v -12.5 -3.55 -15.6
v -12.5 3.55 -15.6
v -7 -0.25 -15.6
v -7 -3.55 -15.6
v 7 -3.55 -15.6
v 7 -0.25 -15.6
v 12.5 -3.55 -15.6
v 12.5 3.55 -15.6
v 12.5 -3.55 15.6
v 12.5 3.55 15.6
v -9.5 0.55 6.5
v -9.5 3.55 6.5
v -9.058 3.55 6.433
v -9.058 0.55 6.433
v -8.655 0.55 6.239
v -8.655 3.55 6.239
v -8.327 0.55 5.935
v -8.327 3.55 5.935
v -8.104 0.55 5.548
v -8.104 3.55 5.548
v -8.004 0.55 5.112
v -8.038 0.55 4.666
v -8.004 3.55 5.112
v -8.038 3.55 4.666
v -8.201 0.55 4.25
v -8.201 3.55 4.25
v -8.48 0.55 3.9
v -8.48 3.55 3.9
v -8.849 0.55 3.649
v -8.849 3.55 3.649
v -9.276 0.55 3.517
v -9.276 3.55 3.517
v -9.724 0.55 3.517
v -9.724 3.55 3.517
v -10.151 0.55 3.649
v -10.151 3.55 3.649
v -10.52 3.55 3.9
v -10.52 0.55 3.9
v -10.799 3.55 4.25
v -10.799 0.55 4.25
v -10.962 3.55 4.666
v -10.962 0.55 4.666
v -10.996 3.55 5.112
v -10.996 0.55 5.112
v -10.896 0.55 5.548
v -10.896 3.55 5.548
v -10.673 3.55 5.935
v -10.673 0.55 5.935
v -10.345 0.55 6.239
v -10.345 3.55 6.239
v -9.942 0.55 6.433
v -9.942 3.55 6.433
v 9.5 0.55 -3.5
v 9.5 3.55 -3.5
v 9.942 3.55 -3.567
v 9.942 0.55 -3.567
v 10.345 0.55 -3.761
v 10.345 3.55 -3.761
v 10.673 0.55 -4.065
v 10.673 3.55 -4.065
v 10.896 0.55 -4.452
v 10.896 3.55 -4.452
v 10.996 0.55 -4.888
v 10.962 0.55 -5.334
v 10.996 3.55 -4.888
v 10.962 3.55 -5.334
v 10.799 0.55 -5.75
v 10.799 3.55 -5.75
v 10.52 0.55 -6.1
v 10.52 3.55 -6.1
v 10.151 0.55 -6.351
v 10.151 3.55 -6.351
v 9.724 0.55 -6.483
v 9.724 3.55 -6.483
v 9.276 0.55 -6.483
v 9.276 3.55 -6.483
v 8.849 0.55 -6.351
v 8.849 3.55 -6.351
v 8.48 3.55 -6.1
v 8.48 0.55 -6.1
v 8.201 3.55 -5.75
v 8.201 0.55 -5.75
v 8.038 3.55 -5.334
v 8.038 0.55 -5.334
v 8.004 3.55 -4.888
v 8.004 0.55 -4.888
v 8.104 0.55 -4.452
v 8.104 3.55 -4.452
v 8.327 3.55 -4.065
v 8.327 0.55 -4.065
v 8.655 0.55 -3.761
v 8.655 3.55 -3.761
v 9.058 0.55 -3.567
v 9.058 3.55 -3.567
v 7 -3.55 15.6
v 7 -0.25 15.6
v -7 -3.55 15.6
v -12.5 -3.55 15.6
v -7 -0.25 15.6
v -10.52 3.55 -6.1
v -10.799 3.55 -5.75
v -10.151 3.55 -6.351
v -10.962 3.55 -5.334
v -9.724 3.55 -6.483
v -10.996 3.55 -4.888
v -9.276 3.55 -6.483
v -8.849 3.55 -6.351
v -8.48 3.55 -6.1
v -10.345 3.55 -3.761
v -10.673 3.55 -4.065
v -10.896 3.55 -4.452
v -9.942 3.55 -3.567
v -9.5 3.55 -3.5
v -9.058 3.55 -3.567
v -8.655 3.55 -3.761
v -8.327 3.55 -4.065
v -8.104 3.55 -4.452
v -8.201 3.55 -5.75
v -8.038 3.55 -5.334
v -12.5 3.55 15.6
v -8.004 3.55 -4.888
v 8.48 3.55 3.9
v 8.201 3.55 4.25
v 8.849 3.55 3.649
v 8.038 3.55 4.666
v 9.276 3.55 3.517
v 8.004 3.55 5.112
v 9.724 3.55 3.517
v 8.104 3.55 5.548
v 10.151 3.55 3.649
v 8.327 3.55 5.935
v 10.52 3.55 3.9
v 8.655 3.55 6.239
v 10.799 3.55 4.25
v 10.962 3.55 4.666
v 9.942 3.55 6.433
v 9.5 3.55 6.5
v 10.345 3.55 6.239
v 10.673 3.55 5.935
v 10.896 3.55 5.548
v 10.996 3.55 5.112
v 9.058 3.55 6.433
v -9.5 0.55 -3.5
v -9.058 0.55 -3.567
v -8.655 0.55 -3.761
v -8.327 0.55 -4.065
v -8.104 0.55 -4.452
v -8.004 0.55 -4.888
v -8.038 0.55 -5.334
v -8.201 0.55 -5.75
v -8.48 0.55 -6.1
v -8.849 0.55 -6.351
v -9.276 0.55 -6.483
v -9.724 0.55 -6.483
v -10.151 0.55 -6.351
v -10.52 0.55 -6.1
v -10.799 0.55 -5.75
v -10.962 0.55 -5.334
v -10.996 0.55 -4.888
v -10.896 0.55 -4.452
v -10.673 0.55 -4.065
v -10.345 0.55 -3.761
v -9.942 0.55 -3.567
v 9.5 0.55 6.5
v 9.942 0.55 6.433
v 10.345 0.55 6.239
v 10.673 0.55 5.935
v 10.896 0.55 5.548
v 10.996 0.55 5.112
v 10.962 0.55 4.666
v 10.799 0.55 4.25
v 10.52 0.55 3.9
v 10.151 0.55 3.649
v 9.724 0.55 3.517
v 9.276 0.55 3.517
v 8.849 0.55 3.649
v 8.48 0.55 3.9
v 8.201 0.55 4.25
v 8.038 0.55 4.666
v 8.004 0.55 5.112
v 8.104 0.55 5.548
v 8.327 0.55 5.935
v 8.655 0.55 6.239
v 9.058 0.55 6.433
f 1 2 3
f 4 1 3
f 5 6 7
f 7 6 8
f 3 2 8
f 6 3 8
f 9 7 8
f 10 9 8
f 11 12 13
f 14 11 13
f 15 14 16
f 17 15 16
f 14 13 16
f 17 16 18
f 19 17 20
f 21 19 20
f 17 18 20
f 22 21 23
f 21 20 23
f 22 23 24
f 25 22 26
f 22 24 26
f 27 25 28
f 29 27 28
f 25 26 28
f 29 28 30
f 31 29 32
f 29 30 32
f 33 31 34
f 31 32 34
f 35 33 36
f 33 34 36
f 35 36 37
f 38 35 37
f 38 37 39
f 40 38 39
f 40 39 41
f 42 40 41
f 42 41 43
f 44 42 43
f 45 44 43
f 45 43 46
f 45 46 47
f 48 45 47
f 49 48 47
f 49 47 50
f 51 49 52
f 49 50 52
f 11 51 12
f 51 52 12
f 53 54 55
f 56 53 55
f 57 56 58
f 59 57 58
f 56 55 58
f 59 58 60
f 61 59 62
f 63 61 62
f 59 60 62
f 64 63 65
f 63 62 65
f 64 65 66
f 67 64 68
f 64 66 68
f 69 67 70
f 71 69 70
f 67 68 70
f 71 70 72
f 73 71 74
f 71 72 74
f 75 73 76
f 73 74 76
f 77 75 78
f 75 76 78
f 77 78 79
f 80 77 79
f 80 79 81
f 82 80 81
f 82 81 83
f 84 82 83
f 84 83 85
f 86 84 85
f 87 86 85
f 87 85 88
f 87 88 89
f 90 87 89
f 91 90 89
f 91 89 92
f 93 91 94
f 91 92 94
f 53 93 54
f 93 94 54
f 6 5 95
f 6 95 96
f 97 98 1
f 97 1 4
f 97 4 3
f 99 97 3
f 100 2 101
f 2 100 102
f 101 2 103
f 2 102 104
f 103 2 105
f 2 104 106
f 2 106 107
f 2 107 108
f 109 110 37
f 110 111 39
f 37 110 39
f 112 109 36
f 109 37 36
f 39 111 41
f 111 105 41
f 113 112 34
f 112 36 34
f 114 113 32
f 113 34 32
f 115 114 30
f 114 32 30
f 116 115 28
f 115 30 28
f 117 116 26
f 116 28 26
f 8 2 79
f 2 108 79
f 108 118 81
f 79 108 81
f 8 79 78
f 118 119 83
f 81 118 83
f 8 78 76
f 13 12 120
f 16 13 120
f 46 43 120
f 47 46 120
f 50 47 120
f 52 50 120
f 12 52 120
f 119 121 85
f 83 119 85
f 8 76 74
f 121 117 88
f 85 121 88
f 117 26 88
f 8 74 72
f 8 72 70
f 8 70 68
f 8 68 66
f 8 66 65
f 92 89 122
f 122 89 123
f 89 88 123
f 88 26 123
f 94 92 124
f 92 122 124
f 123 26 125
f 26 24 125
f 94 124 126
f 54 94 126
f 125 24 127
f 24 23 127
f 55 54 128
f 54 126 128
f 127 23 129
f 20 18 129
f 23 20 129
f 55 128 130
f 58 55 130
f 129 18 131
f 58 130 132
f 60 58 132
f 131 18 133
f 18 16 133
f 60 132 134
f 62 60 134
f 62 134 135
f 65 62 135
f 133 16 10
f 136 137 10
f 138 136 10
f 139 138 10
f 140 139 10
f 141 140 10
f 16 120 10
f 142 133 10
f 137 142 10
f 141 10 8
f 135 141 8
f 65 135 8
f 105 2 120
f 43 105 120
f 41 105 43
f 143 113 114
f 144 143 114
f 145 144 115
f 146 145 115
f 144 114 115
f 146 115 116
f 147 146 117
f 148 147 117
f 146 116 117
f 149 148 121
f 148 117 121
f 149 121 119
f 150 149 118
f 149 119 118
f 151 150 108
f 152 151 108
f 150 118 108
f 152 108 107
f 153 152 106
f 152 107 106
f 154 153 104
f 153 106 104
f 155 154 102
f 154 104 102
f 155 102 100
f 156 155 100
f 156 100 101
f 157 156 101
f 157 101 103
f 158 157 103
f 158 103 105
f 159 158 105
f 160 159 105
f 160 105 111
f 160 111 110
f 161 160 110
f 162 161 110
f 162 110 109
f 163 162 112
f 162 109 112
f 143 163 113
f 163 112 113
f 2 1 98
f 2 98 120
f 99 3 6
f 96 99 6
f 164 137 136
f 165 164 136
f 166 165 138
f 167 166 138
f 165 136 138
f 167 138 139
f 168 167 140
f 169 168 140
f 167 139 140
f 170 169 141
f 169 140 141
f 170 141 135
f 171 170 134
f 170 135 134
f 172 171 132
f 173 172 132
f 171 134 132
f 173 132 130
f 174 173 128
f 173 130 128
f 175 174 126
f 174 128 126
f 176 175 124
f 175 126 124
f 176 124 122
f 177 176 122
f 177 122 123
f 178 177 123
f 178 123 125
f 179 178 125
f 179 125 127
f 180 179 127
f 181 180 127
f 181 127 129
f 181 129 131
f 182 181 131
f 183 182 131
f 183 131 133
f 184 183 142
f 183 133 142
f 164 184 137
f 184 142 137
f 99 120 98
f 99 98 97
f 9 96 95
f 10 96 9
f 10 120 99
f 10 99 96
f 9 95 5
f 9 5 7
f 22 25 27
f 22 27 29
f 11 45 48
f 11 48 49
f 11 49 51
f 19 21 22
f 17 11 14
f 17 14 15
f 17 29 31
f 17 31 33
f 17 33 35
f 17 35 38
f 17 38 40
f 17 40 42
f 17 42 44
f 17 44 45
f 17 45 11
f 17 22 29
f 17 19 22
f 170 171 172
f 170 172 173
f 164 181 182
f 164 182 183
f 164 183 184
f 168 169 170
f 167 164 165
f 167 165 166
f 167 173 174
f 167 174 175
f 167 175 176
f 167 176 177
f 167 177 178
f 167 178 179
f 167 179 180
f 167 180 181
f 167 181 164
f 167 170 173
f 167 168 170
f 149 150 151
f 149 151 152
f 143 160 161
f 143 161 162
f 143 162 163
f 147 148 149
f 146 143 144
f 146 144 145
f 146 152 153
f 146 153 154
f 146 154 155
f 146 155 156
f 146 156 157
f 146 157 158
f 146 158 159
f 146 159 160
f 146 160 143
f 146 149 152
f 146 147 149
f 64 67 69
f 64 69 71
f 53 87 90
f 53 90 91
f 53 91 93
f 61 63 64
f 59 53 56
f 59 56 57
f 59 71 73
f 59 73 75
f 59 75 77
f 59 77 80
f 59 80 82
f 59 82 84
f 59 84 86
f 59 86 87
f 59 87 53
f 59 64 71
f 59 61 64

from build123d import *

# Parameters (mm, degrees)
SKETCH_1_W               = 25
SKETCH_1_H               = 7.1
EXTRUDE_1_DEPTH          = 15.6
CUT_EXTRUDE_1_DEPTH      = 34.797817977
CUT_EXTRUDE_1_DEPTH_BACK = 34.797817977
SKETCH_2_W               = 14
SKETCH_2_H               = 3.3
SKETCH_3_R               = 1.5
CUT_EXTRUDE_2_DEPTH      = 3


with BuildPart() as part:
    # 草图1 → 凸台-拉伸1 (new, symmetric)
    with BuildSketch(Plane.XY):
        Rectangle(SKETCH_1_W, SKETCH_1_H)
    extrude(amount=EXTRUDE_1_DEPTH, both=True)

    # 草图2 → 切除-拉伸1 (cut, two sides: drawn at the far end of the back side and taken through both)
    with BuildSketch(Plane.XY.offset(15.6).offset(-CUT_EXTRUDE_1_DEPTH_BACK)):
        with Locations((0, -1.9)):
            Rectangle(SKETCH_2_W, SKETCH_2_H)
    extrude(amount=CUT_EXTRUDE_1_DEPTH + CUT_EXTRUDE_1_DEPTH_BACK, mode=Mode.SUBTRACT)

    # 草图3 → 切除-拉伸2 (cut)
    with BuildSketch(Plane(origin=(0, 3.55, 0), x_dir=(1, 0, 0), z_dir=(0, 1, 0))):
        with Locations(Location((9.5, -5, 0), (0, 0, 270))):
            Circle(SKETCH_3_R)
        with Locations(Location((-9.5, -5, 0), (0, 0, 270))):
            Circle(SKETCH_3_R)
        with Locations(Location((-9.5, 5, 0), (0, 0, 270))):
            Circle(SKETCH_3_R)
        with Locations(Location((9.5, 5, 0), (0, 0, 270))):
            Circle(SKETCH_3_R)
    extrude(amount=-CUT_EXTRUDE_2_DEPTH, mode=Mode.SUBTRACT)


solid = part.part
